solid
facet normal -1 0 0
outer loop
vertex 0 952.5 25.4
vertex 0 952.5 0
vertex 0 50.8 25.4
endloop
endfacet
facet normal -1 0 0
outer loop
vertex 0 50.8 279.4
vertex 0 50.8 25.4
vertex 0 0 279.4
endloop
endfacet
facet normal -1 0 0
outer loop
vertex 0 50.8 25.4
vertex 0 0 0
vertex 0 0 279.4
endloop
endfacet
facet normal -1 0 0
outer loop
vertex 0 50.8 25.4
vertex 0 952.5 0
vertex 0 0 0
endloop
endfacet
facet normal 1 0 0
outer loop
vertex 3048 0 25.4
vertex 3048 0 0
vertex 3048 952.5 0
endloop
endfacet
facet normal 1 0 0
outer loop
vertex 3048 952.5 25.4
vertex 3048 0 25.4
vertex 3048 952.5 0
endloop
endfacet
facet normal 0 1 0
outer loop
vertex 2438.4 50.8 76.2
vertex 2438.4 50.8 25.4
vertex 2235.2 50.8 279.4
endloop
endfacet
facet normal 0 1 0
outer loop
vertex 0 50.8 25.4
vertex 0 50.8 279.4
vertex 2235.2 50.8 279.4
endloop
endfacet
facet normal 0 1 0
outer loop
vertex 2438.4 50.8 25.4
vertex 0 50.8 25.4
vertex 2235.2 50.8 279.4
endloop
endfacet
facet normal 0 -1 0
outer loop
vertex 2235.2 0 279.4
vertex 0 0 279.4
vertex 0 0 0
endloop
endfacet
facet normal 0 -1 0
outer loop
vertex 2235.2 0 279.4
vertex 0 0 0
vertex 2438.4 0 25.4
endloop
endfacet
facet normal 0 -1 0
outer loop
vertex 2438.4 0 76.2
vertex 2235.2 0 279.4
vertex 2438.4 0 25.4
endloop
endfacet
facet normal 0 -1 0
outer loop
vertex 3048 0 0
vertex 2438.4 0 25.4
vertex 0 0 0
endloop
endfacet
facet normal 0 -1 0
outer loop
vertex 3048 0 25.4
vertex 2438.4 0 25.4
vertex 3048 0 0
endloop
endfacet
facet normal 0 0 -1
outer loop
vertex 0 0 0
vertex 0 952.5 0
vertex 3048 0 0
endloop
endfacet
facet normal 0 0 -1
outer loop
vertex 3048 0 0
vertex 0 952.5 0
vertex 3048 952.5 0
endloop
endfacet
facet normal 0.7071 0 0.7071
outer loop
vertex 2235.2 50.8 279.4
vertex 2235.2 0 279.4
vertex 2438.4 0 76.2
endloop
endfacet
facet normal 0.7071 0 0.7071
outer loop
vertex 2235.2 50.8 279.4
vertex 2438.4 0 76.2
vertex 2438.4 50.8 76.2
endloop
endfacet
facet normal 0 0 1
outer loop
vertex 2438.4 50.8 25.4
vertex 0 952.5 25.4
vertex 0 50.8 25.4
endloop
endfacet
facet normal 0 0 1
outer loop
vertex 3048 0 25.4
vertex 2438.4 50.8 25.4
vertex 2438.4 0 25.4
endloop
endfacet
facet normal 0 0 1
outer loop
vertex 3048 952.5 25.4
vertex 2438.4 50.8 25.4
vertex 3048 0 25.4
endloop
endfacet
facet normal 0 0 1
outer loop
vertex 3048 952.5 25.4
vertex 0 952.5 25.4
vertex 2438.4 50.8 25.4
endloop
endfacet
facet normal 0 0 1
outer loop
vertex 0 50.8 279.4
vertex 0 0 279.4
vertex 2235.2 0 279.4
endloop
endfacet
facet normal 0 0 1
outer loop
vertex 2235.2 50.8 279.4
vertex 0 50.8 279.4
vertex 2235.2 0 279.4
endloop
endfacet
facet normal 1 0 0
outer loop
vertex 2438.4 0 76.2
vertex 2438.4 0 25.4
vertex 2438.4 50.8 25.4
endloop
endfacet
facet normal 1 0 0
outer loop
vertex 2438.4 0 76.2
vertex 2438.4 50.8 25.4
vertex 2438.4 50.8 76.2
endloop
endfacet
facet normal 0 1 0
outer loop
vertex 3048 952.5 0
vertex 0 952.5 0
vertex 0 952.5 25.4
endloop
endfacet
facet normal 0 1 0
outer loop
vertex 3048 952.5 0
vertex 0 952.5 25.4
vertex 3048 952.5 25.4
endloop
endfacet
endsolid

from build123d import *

# Parameters (mm, degrees)
F0_W     = 3048
F0_H     = 952.5
F1_DEPTH = 25.4
F2_W     = 2438.4
F2_H     = 254
F3_DEPTH = 50.8
F4_SIZE  = 203.2


with BuildPart() as f1:
    # F0 (on Top) → F1 (new body)
    with BuildSketch(Plane.XY):
        with Locations((1524, 476.25)):
            Rectangle(F0_W, F0_H)
    extrude(amount=F1_DEPTH)

    # F2 (on face) → F3 (join)
    with BuildSketch(Plane.XZ):
        with Locations((1219.2, 152.4)):
            Rectangle(F2_W, F2_H)
    extrude(amount=-F3_DEPTH)

    # F4
    f4_edges = [f1.edges().sort_by_distance(p)[0] for p in [
        (2438.4, 25.4, 279.4),
    ]]
    chamfer(f4_edges, length=F4_SIZE)


solid = f1.part
